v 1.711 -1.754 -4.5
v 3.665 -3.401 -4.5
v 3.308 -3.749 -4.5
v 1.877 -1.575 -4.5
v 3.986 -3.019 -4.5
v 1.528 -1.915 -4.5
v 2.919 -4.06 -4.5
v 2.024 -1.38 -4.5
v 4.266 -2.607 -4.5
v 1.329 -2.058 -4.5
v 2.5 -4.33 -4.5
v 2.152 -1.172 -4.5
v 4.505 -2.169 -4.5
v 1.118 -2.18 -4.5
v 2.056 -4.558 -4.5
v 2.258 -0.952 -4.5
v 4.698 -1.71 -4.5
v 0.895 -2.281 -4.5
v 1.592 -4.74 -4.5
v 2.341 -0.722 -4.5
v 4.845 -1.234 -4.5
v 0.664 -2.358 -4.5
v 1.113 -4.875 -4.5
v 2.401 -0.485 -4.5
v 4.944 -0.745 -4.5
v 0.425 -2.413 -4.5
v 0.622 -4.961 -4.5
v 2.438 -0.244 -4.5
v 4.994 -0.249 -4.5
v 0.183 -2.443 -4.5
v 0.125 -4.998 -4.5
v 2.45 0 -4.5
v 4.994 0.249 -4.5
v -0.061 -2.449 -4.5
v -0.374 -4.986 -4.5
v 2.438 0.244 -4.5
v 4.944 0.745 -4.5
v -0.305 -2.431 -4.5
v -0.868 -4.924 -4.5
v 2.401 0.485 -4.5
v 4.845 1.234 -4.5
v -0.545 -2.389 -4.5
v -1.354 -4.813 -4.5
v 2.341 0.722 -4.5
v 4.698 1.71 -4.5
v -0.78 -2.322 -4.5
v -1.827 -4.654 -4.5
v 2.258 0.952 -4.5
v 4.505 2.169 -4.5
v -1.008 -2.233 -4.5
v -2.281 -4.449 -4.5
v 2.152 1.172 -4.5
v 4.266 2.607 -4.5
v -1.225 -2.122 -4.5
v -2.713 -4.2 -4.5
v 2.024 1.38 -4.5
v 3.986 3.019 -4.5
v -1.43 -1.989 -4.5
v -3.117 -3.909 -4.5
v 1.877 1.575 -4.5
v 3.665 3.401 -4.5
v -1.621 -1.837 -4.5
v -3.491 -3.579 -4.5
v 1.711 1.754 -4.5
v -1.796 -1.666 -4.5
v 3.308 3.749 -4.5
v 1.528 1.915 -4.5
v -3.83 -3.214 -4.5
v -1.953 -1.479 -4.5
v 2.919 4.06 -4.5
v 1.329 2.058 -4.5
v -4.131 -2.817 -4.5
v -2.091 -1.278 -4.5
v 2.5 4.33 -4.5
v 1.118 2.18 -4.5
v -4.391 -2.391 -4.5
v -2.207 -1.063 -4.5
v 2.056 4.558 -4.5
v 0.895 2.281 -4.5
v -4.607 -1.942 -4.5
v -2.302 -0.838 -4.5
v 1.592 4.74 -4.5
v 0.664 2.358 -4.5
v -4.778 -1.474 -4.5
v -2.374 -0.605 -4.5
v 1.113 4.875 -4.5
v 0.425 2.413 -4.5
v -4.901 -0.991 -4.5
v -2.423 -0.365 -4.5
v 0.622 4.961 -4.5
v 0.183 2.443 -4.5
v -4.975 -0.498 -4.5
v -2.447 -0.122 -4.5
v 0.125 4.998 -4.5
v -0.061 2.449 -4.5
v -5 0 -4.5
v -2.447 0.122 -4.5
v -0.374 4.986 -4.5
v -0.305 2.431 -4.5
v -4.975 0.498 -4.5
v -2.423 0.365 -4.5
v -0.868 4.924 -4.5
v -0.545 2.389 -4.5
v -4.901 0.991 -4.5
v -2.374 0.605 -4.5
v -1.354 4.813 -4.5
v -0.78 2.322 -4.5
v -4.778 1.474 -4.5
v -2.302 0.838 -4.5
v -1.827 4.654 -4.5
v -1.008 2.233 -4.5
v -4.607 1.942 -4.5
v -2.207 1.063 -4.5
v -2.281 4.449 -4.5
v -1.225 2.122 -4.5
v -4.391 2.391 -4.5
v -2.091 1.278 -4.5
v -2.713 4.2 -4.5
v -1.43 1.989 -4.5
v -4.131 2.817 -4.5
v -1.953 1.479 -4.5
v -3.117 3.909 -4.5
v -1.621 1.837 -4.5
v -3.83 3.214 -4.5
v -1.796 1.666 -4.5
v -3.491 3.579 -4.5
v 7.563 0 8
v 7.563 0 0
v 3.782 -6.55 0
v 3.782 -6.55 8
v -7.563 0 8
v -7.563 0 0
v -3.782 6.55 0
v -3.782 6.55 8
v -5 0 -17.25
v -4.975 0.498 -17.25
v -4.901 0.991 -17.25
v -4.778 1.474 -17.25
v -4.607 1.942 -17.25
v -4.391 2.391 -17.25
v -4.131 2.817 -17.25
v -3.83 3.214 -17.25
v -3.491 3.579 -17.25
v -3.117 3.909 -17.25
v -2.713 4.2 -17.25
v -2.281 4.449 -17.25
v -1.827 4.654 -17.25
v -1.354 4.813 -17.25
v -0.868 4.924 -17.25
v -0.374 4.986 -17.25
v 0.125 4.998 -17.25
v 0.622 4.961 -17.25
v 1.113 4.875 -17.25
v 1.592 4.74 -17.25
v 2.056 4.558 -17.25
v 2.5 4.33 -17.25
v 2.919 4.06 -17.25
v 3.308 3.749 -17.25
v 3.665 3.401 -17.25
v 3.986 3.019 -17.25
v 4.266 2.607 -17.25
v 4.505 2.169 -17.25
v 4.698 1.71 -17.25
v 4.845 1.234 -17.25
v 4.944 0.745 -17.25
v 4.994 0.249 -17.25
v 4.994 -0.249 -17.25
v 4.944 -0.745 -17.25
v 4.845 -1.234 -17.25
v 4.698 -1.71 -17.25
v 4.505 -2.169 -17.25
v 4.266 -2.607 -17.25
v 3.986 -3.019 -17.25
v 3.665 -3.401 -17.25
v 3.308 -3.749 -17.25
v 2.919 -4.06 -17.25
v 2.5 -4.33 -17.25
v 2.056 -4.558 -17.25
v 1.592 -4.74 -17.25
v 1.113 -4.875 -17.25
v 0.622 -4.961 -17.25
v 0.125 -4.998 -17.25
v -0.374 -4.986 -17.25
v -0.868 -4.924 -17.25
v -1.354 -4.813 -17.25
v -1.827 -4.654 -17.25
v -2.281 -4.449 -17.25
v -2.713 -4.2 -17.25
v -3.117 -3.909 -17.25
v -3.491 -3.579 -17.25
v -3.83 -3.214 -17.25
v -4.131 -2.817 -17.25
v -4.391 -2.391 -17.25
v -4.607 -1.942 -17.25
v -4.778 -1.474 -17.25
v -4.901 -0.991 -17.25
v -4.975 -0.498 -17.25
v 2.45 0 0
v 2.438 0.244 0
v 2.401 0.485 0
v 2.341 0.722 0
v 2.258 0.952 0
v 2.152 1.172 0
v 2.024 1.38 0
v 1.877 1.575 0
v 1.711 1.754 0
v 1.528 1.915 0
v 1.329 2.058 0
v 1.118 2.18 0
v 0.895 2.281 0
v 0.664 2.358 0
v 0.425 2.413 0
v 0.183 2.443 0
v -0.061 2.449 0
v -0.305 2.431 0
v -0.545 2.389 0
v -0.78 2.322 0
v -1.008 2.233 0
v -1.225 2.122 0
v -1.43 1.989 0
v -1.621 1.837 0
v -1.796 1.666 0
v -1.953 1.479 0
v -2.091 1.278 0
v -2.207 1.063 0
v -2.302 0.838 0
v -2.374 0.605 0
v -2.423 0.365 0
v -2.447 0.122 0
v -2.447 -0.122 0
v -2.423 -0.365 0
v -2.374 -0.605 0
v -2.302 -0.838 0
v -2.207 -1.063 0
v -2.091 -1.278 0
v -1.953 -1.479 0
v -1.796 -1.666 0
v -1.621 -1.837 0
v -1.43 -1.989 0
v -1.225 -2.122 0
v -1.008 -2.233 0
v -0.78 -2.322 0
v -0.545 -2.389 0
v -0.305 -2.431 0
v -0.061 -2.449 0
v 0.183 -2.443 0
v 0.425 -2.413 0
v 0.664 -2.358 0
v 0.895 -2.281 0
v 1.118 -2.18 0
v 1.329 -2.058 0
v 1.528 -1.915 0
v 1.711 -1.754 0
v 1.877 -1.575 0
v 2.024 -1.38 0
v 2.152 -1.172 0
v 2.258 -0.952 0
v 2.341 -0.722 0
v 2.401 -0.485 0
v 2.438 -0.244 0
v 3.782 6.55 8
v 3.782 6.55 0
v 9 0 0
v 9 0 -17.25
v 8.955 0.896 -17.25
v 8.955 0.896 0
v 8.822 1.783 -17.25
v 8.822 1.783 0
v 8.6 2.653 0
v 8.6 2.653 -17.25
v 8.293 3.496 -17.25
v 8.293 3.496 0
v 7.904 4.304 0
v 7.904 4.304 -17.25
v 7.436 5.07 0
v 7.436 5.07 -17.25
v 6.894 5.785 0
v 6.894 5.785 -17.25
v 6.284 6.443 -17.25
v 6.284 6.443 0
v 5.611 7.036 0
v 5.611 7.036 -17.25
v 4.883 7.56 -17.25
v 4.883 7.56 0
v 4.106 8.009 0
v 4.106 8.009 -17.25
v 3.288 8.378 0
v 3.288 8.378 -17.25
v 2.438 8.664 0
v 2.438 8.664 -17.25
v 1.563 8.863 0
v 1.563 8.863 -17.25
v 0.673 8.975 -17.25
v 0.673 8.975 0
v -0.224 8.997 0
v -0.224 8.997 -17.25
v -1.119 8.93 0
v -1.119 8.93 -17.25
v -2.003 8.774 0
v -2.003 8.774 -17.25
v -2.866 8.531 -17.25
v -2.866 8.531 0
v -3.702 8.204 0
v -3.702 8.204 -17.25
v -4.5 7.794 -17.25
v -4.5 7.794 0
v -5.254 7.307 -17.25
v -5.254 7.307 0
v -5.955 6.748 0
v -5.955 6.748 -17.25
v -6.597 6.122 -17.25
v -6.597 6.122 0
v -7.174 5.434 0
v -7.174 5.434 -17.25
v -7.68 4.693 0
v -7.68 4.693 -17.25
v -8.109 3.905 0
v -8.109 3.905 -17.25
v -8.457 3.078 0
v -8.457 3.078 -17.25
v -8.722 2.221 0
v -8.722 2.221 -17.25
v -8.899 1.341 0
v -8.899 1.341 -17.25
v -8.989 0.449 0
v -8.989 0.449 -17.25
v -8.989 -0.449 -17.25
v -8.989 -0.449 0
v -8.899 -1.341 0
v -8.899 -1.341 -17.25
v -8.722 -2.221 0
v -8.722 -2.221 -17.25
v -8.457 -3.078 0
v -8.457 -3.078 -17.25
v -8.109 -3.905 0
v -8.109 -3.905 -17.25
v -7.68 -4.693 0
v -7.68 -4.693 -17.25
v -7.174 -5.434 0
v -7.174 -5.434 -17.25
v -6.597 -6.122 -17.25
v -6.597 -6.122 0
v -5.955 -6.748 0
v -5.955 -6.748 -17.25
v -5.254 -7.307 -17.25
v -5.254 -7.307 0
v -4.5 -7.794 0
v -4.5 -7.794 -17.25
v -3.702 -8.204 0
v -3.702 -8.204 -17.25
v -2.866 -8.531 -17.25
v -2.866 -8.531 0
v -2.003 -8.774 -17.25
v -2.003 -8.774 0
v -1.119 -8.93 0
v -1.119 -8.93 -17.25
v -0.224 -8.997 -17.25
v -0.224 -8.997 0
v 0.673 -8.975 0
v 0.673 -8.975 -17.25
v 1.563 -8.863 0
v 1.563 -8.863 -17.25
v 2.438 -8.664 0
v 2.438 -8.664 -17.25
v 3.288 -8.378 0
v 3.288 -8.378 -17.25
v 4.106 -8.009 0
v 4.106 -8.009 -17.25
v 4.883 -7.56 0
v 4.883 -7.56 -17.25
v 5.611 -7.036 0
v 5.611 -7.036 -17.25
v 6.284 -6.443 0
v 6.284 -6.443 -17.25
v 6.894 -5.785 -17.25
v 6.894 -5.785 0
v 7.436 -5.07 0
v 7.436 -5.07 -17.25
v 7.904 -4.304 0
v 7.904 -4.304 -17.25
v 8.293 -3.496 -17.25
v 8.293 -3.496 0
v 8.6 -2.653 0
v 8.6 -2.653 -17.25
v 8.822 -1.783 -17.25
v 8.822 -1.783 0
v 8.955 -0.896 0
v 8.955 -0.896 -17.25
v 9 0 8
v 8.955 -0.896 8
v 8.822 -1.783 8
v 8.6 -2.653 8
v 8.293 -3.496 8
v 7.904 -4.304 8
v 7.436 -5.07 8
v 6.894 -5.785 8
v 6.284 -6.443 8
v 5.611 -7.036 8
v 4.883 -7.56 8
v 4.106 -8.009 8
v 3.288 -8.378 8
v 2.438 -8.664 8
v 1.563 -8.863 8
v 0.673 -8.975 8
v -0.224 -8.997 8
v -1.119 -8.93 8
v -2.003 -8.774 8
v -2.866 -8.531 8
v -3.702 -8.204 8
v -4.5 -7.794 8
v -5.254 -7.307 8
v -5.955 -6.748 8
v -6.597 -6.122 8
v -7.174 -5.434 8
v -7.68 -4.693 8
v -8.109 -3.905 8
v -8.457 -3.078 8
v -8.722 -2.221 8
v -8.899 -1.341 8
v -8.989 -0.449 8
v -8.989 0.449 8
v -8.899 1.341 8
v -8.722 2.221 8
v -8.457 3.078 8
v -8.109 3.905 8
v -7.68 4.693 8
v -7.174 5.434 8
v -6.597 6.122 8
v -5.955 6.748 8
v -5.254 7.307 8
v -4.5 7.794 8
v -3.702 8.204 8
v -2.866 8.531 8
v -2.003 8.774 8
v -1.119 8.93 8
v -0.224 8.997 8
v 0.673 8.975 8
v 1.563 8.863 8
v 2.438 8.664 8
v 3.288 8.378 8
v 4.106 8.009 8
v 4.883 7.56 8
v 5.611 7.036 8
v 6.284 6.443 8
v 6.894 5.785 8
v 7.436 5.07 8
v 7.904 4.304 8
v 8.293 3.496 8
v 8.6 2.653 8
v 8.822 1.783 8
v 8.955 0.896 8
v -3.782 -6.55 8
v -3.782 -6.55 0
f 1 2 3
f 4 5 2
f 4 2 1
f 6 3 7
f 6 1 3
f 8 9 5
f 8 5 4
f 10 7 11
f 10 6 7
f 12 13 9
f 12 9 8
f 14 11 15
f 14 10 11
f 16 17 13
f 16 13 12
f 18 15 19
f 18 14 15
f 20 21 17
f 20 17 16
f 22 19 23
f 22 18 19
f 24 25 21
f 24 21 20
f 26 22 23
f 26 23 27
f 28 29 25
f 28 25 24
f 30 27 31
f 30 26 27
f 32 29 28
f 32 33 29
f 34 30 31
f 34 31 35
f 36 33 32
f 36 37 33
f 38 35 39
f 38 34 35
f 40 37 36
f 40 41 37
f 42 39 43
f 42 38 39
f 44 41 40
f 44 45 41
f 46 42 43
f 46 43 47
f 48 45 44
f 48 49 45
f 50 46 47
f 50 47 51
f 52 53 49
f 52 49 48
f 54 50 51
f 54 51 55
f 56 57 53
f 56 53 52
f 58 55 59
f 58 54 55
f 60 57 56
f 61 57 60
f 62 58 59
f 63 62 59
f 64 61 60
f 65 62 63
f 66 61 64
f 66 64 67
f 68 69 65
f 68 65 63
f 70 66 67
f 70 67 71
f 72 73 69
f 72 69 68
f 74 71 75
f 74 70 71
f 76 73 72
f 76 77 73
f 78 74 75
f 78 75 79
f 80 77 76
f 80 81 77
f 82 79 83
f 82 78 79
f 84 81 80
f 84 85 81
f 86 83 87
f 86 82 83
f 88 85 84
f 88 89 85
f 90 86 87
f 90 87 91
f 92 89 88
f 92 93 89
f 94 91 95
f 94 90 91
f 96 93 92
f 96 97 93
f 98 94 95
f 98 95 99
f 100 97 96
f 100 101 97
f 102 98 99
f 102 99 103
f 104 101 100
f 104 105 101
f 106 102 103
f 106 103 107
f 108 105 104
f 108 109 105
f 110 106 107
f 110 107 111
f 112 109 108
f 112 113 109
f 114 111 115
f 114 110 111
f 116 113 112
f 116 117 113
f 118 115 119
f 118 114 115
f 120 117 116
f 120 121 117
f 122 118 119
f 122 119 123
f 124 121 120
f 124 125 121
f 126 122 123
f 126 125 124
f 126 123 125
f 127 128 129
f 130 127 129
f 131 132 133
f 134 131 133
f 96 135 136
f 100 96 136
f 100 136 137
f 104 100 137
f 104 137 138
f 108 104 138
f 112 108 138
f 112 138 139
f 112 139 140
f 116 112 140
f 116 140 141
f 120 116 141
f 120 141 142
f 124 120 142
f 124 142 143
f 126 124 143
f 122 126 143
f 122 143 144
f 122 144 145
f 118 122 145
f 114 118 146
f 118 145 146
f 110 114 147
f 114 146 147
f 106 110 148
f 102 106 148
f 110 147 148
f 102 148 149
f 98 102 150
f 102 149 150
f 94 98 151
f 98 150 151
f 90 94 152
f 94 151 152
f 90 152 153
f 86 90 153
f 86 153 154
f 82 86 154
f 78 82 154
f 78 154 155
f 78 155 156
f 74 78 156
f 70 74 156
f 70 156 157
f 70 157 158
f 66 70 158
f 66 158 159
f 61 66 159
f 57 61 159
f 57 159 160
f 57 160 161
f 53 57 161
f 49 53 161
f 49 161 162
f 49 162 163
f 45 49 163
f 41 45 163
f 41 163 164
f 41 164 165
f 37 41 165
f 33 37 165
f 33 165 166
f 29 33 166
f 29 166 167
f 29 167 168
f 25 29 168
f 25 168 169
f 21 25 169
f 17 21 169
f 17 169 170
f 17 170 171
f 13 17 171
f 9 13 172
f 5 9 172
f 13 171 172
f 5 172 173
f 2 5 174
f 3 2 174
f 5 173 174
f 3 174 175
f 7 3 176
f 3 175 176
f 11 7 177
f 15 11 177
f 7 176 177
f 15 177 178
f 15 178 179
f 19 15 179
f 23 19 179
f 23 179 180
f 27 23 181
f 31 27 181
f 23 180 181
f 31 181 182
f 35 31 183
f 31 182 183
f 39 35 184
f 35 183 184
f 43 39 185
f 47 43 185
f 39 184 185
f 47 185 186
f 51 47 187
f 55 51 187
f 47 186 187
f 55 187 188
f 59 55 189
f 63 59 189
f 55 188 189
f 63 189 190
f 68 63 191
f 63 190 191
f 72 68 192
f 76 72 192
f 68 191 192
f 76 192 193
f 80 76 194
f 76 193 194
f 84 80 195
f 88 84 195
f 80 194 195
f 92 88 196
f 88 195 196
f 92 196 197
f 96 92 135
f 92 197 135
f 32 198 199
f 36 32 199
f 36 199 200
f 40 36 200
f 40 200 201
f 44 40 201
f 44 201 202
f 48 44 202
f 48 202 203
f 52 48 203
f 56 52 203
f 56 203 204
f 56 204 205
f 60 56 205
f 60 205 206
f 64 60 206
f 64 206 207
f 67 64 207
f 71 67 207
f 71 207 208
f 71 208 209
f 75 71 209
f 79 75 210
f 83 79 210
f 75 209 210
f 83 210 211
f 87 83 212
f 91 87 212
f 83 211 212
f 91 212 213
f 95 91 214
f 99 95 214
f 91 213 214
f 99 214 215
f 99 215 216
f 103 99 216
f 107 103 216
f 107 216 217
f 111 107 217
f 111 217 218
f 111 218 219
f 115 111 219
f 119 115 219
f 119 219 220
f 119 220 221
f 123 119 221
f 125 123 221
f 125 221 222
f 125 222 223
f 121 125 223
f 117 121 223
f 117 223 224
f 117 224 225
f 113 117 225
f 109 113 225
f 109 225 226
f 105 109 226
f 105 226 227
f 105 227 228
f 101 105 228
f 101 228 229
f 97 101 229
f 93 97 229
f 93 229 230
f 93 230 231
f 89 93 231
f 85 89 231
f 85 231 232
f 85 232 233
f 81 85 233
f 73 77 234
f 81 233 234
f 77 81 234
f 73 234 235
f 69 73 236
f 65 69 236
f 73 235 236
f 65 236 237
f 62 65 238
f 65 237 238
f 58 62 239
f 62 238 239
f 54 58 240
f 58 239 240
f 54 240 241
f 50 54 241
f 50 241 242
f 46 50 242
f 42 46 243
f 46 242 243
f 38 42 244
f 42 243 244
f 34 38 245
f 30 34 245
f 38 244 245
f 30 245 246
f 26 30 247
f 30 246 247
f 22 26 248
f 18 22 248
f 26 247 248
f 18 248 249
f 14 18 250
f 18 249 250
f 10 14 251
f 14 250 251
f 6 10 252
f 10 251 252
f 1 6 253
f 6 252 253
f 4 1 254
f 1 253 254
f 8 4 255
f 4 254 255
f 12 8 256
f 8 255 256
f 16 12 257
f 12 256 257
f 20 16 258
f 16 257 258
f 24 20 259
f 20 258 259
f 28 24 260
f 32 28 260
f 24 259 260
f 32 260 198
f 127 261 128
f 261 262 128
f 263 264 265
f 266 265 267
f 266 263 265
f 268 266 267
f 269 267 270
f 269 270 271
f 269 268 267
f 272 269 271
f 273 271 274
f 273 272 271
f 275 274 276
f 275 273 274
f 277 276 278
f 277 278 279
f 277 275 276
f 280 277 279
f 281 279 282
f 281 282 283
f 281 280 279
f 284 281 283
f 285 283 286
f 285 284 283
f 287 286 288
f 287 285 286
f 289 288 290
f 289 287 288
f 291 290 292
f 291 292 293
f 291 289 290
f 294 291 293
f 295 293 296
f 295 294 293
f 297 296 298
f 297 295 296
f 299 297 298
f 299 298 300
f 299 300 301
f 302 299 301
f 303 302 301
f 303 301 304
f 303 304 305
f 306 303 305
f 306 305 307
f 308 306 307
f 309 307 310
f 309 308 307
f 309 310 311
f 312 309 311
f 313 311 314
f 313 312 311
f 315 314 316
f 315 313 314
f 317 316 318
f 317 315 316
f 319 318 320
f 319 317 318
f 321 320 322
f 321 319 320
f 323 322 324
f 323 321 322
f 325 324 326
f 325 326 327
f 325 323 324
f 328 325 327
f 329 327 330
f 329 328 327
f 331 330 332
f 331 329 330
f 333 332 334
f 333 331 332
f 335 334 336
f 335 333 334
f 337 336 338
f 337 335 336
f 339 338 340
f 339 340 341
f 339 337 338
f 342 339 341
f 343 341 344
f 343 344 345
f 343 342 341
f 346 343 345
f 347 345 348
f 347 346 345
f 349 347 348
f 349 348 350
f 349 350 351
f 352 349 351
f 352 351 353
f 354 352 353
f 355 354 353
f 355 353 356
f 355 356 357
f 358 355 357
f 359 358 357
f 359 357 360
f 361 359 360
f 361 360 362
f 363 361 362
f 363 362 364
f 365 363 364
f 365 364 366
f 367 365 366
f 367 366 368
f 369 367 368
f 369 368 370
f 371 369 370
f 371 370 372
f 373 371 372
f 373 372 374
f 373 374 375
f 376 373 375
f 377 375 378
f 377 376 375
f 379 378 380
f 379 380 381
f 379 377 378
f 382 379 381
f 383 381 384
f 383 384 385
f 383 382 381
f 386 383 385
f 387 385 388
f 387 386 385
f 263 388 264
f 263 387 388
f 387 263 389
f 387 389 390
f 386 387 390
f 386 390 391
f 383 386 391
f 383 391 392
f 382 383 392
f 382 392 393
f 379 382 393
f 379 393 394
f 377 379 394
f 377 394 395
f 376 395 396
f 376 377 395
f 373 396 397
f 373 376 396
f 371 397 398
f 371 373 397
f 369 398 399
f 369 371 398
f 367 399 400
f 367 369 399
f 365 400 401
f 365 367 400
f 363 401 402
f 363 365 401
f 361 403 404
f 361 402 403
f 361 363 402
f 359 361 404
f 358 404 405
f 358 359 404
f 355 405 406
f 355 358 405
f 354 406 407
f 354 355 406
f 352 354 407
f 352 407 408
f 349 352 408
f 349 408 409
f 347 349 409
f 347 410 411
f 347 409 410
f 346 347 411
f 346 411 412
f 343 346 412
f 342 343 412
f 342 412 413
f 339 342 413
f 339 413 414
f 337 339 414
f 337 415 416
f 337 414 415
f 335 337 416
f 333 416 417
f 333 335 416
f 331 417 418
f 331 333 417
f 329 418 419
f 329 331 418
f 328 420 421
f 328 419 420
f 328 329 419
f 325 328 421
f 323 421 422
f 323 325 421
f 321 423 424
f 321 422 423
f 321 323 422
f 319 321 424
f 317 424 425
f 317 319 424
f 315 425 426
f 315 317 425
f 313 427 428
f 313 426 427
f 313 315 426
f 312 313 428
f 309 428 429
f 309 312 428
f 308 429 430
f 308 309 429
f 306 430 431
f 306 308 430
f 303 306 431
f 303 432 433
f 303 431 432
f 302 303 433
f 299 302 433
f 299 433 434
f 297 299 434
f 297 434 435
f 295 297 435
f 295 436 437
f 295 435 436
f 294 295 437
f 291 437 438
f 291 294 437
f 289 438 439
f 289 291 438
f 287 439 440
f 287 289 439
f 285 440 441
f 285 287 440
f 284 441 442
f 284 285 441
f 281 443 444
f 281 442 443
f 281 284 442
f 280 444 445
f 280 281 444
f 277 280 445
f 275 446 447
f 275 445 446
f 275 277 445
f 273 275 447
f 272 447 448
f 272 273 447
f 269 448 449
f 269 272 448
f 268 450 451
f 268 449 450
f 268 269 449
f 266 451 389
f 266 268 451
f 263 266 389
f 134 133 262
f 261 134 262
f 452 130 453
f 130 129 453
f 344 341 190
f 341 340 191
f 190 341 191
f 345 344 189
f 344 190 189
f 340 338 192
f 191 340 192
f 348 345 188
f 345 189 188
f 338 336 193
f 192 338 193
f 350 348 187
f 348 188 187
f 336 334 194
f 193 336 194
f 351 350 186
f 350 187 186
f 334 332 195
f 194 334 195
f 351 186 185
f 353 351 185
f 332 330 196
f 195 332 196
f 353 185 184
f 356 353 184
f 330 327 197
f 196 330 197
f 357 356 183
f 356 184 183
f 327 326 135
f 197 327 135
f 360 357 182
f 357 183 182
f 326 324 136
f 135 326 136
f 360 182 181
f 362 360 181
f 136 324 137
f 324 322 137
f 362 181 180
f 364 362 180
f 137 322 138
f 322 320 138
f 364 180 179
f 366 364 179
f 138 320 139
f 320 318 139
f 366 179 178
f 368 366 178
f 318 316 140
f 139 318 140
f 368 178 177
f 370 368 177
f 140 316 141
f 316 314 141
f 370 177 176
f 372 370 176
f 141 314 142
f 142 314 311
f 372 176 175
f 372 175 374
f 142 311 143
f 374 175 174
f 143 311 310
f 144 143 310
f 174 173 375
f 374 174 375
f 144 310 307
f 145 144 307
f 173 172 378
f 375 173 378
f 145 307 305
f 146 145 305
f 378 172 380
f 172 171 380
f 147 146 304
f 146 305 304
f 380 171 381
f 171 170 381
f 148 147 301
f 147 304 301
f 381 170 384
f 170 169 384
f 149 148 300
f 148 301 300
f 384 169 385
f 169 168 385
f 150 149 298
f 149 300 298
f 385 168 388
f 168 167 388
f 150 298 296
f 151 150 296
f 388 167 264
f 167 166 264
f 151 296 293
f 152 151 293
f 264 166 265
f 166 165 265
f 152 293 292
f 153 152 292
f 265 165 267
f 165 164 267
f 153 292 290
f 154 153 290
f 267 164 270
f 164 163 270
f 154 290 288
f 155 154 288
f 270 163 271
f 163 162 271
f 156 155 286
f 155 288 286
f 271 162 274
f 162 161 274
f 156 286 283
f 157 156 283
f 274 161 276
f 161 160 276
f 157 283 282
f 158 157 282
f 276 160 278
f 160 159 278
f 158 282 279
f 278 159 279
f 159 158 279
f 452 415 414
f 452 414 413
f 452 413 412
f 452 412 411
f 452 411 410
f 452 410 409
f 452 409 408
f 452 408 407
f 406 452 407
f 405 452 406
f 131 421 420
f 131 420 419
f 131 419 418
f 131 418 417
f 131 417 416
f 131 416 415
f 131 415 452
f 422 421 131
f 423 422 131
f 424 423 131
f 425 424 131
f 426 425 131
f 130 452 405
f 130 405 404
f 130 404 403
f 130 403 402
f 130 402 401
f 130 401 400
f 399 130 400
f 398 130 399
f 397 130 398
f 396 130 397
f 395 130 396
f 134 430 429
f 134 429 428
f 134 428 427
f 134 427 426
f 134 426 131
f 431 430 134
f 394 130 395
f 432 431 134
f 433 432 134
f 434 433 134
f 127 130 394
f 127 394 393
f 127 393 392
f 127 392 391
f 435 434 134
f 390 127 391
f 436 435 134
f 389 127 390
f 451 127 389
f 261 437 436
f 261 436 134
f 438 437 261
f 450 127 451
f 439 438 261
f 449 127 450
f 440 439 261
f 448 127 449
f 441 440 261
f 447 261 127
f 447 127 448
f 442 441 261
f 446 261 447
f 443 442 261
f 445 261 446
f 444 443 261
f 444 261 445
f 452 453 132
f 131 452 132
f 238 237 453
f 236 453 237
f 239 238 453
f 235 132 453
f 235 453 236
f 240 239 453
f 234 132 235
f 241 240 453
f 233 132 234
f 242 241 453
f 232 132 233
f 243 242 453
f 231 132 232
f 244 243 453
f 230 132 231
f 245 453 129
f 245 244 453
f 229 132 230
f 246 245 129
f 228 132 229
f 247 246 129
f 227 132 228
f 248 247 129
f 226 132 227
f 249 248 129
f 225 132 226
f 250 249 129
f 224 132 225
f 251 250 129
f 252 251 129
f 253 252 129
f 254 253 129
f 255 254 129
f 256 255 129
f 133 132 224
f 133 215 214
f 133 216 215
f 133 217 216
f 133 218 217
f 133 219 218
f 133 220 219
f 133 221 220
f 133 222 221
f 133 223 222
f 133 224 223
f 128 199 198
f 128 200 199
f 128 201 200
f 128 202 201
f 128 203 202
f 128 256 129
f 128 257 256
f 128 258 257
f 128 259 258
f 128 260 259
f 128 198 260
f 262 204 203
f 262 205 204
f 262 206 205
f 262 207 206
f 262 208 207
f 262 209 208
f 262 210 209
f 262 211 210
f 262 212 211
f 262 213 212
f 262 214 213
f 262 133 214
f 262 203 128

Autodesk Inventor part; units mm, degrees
ref_plane "YZ Plane" through (0, 0, 0) normal (1, 0, 0) x (0, 1, 0)
ref_plane "XZ Plane" through (0, 0, 0) normal (0, 1, 0) x (-1, 0, 0)
ref_plane "XY Plane" through (0, 0, 0) normal (0, 0, 1) x (1, 0, 0)
sketch "Sketch1" plane through (0, 0, 0) normal (0, 0, 1) x (1, 0, 0)
  line L0 (-7.5633, 0) -> (-3.7816, 6.55)
  line L1 (-3.7816, 6.55) -> (3.7816, 6.55)
  line L2 (3.7816, 6.55) -> (7.5633, 0)
  line L3 (7.5633, 0) -> (3.7816, -6.55)
  line L4 (3.7816, -6.55) -> (-3.7816, -6.55)
  line L5 (-3.7816, -6.55) -> (-7.5633, 0)
  circle A0 centre (0, 0) radius 9
  circle A1 centre (0, 0) radius 2.45
  point P0 (0, -6.55)
  point P1 (0, 6.55)
  dimension "d0" = 13.1
  dimension "d1" = 18
  dimension "d2" = 4.9
extrude "Extrusion1" add sketch "Sketch1" along normal blind 8 contours A0
extrude "Extrusion2" add sketch "Sketch1" against normal blind 17.25 contours L0 L1 L2 L3 L4 L5 | A0
sketch "Sketch2" plane through (0, 0, -17.25) normal (0, 0, -1) x (-1, 0, 0)
  circle A0 centre (0, 0) radius 5
  dimension "d7" = 10
extrude "Extrusion3" cut sketch "Sketch2" against normal blind 12.75
properties part number "End Shaft Spacers"
